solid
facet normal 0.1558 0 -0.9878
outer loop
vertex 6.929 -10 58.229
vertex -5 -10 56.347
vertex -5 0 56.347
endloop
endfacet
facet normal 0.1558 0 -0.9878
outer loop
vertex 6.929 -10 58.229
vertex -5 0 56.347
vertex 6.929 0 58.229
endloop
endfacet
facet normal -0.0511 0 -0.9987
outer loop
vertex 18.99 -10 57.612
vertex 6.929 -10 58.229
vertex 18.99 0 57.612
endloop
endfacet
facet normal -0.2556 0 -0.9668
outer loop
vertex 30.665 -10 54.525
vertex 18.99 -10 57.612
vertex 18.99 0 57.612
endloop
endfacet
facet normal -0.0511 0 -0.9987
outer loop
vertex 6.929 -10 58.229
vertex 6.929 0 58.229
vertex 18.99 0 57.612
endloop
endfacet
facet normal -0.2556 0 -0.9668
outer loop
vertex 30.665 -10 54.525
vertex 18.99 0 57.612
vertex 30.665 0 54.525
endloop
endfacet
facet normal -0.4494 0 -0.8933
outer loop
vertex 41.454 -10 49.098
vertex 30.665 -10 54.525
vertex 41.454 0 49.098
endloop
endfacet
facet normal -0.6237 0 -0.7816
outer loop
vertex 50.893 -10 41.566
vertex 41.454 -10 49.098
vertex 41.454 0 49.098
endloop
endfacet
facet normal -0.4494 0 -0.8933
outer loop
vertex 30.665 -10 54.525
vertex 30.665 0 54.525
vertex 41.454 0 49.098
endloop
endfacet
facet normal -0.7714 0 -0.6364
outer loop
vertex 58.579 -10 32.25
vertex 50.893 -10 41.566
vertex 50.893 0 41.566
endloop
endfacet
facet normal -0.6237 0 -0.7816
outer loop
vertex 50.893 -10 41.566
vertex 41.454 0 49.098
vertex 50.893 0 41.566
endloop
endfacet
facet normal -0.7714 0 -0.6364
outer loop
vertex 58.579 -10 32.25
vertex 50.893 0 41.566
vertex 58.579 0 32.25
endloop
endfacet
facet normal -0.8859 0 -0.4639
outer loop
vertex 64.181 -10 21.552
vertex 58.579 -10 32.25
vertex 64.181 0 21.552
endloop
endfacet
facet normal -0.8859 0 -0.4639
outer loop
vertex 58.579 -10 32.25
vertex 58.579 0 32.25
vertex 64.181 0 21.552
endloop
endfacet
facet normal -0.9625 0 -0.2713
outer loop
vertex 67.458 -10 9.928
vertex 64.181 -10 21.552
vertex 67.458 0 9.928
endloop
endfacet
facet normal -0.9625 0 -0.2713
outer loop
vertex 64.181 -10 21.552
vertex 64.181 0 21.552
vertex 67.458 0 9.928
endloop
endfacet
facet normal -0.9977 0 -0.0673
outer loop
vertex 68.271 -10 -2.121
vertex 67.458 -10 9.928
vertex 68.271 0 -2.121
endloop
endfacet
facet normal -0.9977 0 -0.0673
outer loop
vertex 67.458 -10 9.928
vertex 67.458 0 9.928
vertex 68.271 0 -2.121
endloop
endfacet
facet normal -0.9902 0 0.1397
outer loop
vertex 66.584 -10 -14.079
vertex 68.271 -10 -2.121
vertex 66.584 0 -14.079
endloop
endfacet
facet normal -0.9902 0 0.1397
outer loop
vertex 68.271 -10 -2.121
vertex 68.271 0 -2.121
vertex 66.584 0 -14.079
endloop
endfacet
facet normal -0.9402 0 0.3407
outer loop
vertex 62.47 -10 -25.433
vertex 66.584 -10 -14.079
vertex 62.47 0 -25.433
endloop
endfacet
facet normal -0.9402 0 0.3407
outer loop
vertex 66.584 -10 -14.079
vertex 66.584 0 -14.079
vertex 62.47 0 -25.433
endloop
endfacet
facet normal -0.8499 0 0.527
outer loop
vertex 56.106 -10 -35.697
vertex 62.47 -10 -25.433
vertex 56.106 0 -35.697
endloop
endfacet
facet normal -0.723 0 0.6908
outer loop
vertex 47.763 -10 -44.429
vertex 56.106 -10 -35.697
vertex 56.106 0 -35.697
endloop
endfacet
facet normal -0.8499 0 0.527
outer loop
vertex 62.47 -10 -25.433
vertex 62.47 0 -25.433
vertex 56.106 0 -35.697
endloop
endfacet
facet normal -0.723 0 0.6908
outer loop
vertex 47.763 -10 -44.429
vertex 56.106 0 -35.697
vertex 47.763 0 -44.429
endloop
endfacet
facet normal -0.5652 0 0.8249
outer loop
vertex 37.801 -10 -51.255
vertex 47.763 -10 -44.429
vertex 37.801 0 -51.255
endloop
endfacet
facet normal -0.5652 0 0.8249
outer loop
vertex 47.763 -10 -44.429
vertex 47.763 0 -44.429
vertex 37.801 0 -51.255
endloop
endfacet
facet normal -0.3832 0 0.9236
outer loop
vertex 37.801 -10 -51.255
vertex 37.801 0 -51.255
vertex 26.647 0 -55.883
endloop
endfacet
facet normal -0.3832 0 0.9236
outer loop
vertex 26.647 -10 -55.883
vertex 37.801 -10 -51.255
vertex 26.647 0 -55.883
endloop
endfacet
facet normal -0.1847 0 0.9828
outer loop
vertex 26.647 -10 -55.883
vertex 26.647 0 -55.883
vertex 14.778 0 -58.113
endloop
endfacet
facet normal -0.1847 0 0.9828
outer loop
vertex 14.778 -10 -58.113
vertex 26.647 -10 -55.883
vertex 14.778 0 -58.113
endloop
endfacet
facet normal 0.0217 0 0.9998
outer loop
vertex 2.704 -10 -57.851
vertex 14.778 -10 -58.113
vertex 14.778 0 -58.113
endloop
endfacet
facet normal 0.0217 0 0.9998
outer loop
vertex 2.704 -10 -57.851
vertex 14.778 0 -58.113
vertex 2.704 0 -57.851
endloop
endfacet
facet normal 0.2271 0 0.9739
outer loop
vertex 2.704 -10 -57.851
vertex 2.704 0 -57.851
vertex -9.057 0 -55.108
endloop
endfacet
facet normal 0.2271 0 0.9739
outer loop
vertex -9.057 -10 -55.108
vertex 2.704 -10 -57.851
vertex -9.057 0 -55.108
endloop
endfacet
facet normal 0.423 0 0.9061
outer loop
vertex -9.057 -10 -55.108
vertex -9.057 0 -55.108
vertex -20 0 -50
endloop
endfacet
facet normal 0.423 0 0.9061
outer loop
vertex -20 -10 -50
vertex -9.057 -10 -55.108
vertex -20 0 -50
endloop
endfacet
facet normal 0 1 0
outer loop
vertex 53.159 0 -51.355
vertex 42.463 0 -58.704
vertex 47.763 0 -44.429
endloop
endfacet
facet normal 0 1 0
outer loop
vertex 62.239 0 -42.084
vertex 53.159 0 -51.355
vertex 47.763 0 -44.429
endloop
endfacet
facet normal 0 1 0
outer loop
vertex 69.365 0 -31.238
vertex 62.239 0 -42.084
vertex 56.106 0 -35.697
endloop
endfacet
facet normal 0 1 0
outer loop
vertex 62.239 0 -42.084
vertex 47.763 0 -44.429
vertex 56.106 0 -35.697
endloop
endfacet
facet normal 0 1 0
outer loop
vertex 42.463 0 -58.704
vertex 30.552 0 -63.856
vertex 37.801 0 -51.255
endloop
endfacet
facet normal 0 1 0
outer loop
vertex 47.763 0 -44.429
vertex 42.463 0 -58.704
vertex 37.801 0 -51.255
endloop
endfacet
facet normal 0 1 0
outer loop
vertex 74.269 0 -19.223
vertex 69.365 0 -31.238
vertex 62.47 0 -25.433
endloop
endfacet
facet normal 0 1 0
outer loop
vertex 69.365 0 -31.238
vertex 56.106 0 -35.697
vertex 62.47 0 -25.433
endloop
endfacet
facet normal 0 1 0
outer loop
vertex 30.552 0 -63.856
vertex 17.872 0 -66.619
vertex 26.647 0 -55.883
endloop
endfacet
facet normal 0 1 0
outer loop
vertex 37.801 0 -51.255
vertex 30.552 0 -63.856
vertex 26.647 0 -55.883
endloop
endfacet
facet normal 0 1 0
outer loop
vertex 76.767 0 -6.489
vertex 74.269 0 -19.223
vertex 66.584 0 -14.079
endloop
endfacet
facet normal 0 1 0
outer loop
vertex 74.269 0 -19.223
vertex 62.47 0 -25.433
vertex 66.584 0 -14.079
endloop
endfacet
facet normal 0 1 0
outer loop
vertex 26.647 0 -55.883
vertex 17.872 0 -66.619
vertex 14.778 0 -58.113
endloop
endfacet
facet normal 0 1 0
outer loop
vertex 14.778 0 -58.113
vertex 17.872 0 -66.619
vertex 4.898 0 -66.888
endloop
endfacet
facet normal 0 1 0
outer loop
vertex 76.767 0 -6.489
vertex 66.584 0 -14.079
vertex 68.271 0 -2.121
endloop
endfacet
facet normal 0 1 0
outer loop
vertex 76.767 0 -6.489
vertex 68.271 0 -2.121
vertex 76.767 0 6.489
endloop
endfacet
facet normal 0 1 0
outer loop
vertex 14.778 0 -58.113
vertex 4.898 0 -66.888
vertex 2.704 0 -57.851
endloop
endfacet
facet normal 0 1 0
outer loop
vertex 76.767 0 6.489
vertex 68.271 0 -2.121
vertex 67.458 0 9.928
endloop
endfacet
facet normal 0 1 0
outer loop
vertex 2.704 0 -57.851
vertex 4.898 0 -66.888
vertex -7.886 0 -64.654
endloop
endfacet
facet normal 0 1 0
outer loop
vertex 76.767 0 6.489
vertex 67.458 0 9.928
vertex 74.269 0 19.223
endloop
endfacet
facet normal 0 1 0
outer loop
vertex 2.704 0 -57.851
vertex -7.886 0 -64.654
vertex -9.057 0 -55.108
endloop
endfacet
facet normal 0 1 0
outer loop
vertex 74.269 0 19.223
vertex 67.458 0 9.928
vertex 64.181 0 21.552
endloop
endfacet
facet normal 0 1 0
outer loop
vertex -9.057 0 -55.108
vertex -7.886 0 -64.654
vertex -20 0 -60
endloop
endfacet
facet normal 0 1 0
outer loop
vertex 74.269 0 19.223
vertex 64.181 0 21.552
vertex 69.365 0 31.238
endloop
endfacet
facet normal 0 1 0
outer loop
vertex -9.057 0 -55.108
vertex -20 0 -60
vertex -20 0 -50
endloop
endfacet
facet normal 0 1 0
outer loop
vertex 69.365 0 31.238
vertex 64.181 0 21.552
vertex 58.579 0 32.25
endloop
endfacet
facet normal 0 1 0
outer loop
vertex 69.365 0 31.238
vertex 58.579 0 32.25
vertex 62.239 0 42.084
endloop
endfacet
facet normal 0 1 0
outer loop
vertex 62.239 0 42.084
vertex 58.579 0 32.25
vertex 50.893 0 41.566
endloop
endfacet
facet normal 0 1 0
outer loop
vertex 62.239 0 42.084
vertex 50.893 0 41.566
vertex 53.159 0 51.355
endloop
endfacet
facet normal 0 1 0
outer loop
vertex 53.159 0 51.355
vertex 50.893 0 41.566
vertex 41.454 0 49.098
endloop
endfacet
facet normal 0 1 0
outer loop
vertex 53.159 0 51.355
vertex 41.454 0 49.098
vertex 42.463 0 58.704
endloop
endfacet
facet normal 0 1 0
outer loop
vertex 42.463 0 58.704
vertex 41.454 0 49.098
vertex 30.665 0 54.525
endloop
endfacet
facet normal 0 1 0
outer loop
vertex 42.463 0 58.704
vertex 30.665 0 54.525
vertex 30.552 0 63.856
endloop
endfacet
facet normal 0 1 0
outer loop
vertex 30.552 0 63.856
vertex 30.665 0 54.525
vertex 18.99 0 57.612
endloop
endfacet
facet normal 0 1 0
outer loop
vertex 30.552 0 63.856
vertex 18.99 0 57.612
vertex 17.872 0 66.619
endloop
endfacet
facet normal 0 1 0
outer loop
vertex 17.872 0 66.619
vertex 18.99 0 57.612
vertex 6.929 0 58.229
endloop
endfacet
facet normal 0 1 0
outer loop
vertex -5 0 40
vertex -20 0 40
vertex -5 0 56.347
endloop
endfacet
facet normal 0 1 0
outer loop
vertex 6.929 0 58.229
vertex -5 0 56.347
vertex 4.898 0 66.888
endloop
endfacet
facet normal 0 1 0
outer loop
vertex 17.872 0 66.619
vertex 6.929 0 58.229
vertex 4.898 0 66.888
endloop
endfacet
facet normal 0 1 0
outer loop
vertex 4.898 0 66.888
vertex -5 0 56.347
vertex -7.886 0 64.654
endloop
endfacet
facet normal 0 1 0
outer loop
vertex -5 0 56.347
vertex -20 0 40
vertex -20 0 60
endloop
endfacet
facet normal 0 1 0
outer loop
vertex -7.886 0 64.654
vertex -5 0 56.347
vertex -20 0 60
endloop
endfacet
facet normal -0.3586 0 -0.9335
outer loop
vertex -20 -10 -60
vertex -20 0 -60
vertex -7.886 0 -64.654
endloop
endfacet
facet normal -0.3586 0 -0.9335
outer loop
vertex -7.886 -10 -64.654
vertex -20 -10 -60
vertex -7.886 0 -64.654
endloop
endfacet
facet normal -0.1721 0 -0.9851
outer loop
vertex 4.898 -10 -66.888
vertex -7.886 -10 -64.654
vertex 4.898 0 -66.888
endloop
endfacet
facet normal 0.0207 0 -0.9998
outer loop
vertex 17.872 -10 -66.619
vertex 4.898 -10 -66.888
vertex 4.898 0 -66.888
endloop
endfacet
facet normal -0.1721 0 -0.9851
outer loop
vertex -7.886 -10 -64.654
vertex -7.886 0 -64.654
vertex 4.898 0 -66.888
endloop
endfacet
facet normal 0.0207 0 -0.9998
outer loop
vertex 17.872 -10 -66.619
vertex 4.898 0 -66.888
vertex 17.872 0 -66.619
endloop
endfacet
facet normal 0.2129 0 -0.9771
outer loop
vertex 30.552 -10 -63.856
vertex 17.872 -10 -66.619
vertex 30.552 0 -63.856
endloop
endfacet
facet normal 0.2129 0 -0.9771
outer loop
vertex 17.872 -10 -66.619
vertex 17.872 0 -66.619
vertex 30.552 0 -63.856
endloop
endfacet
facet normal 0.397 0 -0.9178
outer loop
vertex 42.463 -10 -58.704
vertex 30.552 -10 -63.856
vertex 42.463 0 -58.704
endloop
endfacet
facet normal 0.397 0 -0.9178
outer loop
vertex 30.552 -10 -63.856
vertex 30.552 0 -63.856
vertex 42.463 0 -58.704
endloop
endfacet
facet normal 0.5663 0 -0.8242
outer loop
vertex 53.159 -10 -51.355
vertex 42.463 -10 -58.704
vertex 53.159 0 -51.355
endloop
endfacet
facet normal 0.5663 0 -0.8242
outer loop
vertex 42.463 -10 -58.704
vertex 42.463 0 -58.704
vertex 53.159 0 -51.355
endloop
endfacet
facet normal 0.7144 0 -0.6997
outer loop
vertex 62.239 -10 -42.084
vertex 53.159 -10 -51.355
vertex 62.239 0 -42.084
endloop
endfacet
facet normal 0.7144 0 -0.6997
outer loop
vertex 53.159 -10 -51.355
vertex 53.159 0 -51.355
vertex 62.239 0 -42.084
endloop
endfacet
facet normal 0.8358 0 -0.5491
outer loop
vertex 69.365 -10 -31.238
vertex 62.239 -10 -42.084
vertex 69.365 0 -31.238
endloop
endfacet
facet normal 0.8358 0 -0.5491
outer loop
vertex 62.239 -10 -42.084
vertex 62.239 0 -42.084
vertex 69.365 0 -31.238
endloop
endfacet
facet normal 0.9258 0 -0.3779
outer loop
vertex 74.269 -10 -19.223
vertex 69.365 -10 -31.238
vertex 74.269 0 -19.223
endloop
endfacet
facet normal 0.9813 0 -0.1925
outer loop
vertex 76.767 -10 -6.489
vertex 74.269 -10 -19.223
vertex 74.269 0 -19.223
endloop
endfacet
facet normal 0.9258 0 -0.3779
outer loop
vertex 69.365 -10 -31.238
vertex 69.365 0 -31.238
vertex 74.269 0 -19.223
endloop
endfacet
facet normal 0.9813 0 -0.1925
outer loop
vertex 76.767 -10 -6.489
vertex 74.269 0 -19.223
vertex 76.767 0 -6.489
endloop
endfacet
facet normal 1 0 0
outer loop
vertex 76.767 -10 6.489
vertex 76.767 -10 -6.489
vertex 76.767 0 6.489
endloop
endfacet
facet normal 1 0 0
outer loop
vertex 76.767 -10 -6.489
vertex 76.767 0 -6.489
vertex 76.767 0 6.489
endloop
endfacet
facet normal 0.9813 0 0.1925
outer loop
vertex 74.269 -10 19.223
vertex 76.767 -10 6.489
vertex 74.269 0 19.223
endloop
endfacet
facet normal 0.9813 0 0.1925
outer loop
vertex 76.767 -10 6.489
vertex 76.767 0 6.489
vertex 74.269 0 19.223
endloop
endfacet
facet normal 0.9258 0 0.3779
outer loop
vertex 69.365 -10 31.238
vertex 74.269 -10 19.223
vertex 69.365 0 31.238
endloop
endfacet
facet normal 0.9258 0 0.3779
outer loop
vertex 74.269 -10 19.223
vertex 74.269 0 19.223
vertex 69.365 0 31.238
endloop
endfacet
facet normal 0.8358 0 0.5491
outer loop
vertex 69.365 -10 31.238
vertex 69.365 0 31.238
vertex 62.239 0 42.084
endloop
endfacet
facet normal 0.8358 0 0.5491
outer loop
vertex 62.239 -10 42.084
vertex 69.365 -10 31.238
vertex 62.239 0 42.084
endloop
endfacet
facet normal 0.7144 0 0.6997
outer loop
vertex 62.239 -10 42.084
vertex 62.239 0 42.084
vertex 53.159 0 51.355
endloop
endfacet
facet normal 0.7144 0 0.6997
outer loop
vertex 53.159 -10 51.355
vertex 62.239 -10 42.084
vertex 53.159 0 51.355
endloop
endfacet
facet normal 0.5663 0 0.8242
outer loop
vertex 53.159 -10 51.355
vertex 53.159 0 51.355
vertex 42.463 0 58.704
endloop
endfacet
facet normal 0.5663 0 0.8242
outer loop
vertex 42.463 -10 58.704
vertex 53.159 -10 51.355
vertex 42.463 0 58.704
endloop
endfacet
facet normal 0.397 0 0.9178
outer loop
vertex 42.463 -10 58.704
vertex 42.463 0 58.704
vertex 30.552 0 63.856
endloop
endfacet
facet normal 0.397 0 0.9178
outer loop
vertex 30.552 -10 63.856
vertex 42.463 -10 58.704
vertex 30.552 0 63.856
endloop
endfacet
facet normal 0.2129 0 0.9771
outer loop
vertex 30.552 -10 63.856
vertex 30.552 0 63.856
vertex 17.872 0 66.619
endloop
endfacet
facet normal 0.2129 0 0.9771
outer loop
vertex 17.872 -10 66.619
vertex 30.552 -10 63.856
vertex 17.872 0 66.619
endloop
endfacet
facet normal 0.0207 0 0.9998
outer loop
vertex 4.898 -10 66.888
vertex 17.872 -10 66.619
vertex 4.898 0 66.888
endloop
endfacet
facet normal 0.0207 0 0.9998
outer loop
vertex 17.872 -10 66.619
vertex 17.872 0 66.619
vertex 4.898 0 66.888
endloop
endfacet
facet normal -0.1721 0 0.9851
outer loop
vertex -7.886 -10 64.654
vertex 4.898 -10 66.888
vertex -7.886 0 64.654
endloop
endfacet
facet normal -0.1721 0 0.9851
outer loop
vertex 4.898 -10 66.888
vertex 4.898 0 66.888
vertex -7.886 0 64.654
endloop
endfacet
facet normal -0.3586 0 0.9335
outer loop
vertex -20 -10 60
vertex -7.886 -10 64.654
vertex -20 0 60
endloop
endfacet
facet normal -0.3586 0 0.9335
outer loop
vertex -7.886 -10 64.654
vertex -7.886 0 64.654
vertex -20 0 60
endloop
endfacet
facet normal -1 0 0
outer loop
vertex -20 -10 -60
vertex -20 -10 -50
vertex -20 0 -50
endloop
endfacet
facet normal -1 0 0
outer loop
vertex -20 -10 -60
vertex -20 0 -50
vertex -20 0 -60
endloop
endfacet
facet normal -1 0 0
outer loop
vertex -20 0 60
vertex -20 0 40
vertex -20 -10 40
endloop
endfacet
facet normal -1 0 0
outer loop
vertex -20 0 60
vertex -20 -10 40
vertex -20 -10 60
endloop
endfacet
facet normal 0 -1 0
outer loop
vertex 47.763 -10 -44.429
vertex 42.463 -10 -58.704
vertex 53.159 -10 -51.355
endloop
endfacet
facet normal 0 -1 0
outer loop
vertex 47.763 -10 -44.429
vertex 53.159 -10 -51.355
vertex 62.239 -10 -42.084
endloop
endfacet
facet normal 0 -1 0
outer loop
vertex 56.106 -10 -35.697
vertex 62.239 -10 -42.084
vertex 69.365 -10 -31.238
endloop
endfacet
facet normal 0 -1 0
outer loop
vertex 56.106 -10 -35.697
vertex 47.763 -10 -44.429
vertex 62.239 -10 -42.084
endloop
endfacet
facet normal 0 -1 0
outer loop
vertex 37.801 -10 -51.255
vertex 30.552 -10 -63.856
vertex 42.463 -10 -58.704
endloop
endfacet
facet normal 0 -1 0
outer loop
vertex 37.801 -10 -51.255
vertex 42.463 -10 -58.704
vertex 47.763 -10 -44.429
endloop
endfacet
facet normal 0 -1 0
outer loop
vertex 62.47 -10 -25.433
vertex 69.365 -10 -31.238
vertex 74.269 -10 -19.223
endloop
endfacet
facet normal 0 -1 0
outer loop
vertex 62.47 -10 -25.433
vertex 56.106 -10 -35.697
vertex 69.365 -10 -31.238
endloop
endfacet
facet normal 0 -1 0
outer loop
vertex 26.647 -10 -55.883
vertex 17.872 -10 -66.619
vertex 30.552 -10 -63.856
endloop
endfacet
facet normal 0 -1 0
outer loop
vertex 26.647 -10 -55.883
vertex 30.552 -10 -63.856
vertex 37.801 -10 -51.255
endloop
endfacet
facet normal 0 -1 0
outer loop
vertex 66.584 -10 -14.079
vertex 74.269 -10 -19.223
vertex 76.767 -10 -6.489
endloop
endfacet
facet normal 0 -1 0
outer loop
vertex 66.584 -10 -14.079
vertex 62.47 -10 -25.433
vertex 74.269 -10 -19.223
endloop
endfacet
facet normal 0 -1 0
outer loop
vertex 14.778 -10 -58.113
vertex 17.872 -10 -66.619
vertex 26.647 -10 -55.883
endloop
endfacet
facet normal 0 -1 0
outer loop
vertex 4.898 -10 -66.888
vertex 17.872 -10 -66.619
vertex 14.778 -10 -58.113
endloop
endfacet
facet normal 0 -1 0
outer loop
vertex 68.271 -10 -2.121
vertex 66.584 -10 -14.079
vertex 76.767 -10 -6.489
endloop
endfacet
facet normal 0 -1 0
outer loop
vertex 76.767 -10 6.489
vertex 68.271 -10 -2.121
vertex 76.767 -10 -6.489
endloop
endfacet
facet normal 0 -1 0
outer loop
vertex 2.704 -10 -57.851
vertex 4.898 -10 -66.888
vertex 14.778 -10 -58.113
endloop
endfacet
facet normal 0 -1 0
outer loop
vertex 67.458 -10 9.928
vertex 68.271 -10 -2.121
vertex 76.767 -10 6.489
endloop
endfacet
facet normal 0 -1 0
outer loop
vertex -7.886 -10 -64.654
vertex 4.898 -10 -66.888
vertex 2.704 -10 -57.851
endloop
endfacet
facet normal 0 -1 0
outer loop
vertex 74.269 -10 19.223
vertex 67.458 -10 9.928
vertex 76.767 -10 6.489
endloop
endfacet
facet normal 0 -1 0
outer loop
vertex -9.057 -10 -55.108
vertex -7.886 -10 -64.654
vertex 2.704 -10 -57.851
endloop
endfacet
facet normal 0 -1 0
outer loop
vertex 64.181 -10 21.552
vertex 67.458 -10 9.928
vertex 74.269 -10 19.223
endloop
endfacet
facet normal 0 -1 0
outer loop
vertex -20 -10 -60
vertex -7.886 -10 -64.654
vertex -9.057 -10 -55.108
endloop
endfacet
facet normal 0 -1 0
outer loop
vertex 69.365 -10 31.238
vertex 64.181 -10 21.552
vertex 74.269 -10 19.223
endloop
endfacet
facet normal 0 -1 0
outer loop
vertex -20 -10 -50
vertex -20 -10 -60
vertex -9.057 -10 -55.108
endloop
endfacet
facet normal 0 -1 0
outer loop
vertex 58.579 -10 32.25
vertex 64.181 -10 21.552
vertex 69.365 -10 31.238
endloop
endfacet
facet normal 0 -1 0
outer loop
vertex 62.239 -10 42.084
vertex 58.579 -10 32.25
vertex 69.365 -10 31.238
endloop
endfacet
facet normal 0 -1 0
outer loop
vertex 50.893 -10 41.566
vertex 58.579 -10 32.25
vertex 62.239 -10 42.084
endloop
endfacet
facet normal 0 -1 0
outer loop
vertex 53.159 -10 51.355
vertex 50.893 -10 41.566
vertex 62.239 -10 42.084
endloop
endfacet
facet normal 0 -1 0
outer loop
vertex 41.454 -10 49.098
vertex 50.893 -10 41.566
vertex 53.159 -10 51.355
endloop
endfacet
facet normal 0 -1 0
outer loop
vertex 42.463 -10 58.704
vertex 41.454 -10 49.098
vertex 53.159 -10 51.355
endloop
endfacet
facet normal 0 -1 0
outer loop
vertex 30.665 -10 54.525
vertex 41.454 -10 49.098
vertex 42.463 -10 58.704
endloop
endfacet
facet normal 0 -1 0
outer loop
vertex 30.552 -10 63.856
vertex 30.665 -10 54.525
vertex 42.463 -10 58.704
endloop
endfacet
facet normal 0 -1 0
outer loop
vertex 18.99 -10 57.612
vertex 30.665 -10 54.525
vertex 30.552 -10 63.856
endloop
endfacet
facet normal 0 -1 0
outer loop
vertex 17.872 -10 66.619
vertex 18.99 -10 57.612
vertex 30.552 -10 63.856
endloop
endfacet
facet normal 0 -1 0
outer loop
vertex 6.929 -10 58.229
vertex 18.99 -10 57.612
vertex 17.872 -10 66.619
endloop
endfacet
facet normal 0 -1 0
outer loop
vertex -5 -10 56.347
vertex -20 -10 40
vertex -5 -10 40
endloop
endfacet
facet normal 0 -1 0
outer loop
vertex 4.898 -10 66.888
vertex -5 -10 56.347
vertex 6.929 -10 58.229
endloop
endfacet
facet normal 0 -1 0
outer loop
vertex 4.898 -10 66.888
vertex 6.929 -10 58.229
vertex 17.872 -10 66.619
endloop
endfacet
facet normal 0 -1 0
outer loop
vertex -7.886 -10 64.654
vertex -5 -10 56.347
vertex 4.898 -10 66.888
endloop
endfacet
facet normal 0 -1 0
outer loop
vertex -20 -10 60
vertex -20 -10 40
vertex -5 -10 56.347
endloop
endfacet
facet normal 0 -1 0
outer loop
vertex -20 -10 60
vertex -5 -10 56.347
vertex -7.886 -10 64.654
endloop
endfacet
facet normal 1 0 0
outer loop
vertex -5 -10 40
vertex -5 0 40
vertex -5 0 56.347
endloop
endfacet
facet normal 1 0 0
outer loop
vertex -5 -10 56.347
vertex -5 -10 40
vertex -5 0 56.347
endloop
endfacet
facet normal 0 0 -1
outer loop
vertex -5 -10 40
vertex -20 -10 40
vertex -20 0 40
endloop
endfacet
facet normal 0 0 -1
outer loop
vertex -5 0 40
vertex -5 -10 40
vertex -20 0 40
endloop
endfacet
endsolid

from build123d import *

# Parameters (mm, degrees)
BOSS_EXTRUDE1_DEPTH = 10
SKETCH2_W           = 20
SKETCH2_H           = 10
BOSS_EXTRUDE2_DEPTH = 15


with BuildPart() as part:
    # Sketch1 → Boss-Extrude1 (new body)
    with BuildSketch(Plane(origin=(0, 0, 0), x_dir=(1, 0, 0), z_dir=(0, 1, 0))):
        with BuildLine():
            Line((-20, 50), (-20, 60))
            ThreePointArc((-20, 60), (77.082039325, 0), (-20, -60))
            Line((-20, -60), (-20, -50))
            ThreePointArc((-20, -50), (68.309518948, 0), (-20, 50))
        make_face()
    extrude(amount=-BOSS_EXTRUDE1_DEPTH)

    # Sketch2 → Boss-Extrude2 (add)
    with BuildSketch(Plane.ZY.offset(20)):
        with Locations((50, -5)):
            Rectangle(SKETCH2_W, SKETCH2_H)
    extrude(amount=-BOSS_EXTRUDE2_DEPTH)


solid = part.part
